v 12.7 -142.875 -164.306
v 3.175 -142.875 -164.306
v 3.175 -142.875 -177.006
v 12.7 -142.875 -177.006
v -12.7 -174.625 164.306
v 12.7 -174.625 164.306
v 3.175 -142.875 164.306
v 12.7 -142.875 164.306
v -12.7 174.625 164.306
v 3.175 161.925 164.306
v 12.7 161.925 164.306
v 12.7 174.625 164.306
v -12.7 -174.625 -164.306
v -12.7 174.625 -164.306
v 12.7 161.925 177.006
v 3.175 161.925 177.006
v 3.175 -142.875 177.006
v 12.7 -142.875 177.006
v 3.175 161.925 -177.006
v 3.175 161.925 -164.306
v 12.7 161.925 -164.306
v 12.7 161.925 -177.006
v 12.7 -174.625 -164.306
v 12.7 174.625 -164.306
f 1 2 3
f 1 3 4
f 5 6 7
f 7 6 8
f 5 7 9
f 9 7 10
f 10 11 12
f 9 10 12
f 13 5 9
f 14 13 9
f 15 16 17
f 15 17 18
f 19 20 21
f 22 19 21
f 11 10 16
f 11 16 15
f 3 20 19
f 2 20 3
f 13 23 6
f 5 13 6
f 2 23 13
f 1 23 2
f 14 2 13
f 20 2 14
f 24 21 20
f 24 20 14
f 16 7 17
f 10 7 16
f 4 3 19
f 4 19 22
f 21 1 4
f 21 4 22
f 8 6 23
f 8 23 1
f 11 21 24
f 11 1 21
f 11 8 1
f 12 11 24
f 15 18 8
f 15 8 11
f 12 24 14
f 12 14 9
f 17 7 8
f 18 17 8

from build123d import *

# Parameters (mm, degrees)
F0_W     = 349.25
F0_H     = 328.6125
F1_DEPTH = 12.7
F2_W     = 9.525
F2_H     = 304.8
F3_DEPTH = 12.7
F4_W     = 9.525
F4_H     = 304.8
F5_DEPTH = 12.7


with BuildPart() as f1:
    # F0 (on Right) → F1 (new body, symmetric)
    with BuildSketch(Plane.YZ):
        Rectangle(F0_W, F0_H)
    extrude(amount=F1_DEPTH, both=True)

    # F2 (on face) → F3 (join)
    with BuildSketch(Plane.XY.offset(164.30625)):
        with Locations((7.9375, 9.525)):
            Rectangle(F2_W, F2_H)
    extrude(amount=F3_DEPTH)

    # F4 (on face) → F5 (join)
    with BuildSketch(Plane(origin=(0, 0, -164.30625), x_dir=(1, 0, 0), z_dir=(0, 0, -1))):
        with Locations((7.9375, -9.525)):
            Rectangle(F4_W, F4_H)
    extrude(amount=F5_DEPTH)


solid = f1.part
